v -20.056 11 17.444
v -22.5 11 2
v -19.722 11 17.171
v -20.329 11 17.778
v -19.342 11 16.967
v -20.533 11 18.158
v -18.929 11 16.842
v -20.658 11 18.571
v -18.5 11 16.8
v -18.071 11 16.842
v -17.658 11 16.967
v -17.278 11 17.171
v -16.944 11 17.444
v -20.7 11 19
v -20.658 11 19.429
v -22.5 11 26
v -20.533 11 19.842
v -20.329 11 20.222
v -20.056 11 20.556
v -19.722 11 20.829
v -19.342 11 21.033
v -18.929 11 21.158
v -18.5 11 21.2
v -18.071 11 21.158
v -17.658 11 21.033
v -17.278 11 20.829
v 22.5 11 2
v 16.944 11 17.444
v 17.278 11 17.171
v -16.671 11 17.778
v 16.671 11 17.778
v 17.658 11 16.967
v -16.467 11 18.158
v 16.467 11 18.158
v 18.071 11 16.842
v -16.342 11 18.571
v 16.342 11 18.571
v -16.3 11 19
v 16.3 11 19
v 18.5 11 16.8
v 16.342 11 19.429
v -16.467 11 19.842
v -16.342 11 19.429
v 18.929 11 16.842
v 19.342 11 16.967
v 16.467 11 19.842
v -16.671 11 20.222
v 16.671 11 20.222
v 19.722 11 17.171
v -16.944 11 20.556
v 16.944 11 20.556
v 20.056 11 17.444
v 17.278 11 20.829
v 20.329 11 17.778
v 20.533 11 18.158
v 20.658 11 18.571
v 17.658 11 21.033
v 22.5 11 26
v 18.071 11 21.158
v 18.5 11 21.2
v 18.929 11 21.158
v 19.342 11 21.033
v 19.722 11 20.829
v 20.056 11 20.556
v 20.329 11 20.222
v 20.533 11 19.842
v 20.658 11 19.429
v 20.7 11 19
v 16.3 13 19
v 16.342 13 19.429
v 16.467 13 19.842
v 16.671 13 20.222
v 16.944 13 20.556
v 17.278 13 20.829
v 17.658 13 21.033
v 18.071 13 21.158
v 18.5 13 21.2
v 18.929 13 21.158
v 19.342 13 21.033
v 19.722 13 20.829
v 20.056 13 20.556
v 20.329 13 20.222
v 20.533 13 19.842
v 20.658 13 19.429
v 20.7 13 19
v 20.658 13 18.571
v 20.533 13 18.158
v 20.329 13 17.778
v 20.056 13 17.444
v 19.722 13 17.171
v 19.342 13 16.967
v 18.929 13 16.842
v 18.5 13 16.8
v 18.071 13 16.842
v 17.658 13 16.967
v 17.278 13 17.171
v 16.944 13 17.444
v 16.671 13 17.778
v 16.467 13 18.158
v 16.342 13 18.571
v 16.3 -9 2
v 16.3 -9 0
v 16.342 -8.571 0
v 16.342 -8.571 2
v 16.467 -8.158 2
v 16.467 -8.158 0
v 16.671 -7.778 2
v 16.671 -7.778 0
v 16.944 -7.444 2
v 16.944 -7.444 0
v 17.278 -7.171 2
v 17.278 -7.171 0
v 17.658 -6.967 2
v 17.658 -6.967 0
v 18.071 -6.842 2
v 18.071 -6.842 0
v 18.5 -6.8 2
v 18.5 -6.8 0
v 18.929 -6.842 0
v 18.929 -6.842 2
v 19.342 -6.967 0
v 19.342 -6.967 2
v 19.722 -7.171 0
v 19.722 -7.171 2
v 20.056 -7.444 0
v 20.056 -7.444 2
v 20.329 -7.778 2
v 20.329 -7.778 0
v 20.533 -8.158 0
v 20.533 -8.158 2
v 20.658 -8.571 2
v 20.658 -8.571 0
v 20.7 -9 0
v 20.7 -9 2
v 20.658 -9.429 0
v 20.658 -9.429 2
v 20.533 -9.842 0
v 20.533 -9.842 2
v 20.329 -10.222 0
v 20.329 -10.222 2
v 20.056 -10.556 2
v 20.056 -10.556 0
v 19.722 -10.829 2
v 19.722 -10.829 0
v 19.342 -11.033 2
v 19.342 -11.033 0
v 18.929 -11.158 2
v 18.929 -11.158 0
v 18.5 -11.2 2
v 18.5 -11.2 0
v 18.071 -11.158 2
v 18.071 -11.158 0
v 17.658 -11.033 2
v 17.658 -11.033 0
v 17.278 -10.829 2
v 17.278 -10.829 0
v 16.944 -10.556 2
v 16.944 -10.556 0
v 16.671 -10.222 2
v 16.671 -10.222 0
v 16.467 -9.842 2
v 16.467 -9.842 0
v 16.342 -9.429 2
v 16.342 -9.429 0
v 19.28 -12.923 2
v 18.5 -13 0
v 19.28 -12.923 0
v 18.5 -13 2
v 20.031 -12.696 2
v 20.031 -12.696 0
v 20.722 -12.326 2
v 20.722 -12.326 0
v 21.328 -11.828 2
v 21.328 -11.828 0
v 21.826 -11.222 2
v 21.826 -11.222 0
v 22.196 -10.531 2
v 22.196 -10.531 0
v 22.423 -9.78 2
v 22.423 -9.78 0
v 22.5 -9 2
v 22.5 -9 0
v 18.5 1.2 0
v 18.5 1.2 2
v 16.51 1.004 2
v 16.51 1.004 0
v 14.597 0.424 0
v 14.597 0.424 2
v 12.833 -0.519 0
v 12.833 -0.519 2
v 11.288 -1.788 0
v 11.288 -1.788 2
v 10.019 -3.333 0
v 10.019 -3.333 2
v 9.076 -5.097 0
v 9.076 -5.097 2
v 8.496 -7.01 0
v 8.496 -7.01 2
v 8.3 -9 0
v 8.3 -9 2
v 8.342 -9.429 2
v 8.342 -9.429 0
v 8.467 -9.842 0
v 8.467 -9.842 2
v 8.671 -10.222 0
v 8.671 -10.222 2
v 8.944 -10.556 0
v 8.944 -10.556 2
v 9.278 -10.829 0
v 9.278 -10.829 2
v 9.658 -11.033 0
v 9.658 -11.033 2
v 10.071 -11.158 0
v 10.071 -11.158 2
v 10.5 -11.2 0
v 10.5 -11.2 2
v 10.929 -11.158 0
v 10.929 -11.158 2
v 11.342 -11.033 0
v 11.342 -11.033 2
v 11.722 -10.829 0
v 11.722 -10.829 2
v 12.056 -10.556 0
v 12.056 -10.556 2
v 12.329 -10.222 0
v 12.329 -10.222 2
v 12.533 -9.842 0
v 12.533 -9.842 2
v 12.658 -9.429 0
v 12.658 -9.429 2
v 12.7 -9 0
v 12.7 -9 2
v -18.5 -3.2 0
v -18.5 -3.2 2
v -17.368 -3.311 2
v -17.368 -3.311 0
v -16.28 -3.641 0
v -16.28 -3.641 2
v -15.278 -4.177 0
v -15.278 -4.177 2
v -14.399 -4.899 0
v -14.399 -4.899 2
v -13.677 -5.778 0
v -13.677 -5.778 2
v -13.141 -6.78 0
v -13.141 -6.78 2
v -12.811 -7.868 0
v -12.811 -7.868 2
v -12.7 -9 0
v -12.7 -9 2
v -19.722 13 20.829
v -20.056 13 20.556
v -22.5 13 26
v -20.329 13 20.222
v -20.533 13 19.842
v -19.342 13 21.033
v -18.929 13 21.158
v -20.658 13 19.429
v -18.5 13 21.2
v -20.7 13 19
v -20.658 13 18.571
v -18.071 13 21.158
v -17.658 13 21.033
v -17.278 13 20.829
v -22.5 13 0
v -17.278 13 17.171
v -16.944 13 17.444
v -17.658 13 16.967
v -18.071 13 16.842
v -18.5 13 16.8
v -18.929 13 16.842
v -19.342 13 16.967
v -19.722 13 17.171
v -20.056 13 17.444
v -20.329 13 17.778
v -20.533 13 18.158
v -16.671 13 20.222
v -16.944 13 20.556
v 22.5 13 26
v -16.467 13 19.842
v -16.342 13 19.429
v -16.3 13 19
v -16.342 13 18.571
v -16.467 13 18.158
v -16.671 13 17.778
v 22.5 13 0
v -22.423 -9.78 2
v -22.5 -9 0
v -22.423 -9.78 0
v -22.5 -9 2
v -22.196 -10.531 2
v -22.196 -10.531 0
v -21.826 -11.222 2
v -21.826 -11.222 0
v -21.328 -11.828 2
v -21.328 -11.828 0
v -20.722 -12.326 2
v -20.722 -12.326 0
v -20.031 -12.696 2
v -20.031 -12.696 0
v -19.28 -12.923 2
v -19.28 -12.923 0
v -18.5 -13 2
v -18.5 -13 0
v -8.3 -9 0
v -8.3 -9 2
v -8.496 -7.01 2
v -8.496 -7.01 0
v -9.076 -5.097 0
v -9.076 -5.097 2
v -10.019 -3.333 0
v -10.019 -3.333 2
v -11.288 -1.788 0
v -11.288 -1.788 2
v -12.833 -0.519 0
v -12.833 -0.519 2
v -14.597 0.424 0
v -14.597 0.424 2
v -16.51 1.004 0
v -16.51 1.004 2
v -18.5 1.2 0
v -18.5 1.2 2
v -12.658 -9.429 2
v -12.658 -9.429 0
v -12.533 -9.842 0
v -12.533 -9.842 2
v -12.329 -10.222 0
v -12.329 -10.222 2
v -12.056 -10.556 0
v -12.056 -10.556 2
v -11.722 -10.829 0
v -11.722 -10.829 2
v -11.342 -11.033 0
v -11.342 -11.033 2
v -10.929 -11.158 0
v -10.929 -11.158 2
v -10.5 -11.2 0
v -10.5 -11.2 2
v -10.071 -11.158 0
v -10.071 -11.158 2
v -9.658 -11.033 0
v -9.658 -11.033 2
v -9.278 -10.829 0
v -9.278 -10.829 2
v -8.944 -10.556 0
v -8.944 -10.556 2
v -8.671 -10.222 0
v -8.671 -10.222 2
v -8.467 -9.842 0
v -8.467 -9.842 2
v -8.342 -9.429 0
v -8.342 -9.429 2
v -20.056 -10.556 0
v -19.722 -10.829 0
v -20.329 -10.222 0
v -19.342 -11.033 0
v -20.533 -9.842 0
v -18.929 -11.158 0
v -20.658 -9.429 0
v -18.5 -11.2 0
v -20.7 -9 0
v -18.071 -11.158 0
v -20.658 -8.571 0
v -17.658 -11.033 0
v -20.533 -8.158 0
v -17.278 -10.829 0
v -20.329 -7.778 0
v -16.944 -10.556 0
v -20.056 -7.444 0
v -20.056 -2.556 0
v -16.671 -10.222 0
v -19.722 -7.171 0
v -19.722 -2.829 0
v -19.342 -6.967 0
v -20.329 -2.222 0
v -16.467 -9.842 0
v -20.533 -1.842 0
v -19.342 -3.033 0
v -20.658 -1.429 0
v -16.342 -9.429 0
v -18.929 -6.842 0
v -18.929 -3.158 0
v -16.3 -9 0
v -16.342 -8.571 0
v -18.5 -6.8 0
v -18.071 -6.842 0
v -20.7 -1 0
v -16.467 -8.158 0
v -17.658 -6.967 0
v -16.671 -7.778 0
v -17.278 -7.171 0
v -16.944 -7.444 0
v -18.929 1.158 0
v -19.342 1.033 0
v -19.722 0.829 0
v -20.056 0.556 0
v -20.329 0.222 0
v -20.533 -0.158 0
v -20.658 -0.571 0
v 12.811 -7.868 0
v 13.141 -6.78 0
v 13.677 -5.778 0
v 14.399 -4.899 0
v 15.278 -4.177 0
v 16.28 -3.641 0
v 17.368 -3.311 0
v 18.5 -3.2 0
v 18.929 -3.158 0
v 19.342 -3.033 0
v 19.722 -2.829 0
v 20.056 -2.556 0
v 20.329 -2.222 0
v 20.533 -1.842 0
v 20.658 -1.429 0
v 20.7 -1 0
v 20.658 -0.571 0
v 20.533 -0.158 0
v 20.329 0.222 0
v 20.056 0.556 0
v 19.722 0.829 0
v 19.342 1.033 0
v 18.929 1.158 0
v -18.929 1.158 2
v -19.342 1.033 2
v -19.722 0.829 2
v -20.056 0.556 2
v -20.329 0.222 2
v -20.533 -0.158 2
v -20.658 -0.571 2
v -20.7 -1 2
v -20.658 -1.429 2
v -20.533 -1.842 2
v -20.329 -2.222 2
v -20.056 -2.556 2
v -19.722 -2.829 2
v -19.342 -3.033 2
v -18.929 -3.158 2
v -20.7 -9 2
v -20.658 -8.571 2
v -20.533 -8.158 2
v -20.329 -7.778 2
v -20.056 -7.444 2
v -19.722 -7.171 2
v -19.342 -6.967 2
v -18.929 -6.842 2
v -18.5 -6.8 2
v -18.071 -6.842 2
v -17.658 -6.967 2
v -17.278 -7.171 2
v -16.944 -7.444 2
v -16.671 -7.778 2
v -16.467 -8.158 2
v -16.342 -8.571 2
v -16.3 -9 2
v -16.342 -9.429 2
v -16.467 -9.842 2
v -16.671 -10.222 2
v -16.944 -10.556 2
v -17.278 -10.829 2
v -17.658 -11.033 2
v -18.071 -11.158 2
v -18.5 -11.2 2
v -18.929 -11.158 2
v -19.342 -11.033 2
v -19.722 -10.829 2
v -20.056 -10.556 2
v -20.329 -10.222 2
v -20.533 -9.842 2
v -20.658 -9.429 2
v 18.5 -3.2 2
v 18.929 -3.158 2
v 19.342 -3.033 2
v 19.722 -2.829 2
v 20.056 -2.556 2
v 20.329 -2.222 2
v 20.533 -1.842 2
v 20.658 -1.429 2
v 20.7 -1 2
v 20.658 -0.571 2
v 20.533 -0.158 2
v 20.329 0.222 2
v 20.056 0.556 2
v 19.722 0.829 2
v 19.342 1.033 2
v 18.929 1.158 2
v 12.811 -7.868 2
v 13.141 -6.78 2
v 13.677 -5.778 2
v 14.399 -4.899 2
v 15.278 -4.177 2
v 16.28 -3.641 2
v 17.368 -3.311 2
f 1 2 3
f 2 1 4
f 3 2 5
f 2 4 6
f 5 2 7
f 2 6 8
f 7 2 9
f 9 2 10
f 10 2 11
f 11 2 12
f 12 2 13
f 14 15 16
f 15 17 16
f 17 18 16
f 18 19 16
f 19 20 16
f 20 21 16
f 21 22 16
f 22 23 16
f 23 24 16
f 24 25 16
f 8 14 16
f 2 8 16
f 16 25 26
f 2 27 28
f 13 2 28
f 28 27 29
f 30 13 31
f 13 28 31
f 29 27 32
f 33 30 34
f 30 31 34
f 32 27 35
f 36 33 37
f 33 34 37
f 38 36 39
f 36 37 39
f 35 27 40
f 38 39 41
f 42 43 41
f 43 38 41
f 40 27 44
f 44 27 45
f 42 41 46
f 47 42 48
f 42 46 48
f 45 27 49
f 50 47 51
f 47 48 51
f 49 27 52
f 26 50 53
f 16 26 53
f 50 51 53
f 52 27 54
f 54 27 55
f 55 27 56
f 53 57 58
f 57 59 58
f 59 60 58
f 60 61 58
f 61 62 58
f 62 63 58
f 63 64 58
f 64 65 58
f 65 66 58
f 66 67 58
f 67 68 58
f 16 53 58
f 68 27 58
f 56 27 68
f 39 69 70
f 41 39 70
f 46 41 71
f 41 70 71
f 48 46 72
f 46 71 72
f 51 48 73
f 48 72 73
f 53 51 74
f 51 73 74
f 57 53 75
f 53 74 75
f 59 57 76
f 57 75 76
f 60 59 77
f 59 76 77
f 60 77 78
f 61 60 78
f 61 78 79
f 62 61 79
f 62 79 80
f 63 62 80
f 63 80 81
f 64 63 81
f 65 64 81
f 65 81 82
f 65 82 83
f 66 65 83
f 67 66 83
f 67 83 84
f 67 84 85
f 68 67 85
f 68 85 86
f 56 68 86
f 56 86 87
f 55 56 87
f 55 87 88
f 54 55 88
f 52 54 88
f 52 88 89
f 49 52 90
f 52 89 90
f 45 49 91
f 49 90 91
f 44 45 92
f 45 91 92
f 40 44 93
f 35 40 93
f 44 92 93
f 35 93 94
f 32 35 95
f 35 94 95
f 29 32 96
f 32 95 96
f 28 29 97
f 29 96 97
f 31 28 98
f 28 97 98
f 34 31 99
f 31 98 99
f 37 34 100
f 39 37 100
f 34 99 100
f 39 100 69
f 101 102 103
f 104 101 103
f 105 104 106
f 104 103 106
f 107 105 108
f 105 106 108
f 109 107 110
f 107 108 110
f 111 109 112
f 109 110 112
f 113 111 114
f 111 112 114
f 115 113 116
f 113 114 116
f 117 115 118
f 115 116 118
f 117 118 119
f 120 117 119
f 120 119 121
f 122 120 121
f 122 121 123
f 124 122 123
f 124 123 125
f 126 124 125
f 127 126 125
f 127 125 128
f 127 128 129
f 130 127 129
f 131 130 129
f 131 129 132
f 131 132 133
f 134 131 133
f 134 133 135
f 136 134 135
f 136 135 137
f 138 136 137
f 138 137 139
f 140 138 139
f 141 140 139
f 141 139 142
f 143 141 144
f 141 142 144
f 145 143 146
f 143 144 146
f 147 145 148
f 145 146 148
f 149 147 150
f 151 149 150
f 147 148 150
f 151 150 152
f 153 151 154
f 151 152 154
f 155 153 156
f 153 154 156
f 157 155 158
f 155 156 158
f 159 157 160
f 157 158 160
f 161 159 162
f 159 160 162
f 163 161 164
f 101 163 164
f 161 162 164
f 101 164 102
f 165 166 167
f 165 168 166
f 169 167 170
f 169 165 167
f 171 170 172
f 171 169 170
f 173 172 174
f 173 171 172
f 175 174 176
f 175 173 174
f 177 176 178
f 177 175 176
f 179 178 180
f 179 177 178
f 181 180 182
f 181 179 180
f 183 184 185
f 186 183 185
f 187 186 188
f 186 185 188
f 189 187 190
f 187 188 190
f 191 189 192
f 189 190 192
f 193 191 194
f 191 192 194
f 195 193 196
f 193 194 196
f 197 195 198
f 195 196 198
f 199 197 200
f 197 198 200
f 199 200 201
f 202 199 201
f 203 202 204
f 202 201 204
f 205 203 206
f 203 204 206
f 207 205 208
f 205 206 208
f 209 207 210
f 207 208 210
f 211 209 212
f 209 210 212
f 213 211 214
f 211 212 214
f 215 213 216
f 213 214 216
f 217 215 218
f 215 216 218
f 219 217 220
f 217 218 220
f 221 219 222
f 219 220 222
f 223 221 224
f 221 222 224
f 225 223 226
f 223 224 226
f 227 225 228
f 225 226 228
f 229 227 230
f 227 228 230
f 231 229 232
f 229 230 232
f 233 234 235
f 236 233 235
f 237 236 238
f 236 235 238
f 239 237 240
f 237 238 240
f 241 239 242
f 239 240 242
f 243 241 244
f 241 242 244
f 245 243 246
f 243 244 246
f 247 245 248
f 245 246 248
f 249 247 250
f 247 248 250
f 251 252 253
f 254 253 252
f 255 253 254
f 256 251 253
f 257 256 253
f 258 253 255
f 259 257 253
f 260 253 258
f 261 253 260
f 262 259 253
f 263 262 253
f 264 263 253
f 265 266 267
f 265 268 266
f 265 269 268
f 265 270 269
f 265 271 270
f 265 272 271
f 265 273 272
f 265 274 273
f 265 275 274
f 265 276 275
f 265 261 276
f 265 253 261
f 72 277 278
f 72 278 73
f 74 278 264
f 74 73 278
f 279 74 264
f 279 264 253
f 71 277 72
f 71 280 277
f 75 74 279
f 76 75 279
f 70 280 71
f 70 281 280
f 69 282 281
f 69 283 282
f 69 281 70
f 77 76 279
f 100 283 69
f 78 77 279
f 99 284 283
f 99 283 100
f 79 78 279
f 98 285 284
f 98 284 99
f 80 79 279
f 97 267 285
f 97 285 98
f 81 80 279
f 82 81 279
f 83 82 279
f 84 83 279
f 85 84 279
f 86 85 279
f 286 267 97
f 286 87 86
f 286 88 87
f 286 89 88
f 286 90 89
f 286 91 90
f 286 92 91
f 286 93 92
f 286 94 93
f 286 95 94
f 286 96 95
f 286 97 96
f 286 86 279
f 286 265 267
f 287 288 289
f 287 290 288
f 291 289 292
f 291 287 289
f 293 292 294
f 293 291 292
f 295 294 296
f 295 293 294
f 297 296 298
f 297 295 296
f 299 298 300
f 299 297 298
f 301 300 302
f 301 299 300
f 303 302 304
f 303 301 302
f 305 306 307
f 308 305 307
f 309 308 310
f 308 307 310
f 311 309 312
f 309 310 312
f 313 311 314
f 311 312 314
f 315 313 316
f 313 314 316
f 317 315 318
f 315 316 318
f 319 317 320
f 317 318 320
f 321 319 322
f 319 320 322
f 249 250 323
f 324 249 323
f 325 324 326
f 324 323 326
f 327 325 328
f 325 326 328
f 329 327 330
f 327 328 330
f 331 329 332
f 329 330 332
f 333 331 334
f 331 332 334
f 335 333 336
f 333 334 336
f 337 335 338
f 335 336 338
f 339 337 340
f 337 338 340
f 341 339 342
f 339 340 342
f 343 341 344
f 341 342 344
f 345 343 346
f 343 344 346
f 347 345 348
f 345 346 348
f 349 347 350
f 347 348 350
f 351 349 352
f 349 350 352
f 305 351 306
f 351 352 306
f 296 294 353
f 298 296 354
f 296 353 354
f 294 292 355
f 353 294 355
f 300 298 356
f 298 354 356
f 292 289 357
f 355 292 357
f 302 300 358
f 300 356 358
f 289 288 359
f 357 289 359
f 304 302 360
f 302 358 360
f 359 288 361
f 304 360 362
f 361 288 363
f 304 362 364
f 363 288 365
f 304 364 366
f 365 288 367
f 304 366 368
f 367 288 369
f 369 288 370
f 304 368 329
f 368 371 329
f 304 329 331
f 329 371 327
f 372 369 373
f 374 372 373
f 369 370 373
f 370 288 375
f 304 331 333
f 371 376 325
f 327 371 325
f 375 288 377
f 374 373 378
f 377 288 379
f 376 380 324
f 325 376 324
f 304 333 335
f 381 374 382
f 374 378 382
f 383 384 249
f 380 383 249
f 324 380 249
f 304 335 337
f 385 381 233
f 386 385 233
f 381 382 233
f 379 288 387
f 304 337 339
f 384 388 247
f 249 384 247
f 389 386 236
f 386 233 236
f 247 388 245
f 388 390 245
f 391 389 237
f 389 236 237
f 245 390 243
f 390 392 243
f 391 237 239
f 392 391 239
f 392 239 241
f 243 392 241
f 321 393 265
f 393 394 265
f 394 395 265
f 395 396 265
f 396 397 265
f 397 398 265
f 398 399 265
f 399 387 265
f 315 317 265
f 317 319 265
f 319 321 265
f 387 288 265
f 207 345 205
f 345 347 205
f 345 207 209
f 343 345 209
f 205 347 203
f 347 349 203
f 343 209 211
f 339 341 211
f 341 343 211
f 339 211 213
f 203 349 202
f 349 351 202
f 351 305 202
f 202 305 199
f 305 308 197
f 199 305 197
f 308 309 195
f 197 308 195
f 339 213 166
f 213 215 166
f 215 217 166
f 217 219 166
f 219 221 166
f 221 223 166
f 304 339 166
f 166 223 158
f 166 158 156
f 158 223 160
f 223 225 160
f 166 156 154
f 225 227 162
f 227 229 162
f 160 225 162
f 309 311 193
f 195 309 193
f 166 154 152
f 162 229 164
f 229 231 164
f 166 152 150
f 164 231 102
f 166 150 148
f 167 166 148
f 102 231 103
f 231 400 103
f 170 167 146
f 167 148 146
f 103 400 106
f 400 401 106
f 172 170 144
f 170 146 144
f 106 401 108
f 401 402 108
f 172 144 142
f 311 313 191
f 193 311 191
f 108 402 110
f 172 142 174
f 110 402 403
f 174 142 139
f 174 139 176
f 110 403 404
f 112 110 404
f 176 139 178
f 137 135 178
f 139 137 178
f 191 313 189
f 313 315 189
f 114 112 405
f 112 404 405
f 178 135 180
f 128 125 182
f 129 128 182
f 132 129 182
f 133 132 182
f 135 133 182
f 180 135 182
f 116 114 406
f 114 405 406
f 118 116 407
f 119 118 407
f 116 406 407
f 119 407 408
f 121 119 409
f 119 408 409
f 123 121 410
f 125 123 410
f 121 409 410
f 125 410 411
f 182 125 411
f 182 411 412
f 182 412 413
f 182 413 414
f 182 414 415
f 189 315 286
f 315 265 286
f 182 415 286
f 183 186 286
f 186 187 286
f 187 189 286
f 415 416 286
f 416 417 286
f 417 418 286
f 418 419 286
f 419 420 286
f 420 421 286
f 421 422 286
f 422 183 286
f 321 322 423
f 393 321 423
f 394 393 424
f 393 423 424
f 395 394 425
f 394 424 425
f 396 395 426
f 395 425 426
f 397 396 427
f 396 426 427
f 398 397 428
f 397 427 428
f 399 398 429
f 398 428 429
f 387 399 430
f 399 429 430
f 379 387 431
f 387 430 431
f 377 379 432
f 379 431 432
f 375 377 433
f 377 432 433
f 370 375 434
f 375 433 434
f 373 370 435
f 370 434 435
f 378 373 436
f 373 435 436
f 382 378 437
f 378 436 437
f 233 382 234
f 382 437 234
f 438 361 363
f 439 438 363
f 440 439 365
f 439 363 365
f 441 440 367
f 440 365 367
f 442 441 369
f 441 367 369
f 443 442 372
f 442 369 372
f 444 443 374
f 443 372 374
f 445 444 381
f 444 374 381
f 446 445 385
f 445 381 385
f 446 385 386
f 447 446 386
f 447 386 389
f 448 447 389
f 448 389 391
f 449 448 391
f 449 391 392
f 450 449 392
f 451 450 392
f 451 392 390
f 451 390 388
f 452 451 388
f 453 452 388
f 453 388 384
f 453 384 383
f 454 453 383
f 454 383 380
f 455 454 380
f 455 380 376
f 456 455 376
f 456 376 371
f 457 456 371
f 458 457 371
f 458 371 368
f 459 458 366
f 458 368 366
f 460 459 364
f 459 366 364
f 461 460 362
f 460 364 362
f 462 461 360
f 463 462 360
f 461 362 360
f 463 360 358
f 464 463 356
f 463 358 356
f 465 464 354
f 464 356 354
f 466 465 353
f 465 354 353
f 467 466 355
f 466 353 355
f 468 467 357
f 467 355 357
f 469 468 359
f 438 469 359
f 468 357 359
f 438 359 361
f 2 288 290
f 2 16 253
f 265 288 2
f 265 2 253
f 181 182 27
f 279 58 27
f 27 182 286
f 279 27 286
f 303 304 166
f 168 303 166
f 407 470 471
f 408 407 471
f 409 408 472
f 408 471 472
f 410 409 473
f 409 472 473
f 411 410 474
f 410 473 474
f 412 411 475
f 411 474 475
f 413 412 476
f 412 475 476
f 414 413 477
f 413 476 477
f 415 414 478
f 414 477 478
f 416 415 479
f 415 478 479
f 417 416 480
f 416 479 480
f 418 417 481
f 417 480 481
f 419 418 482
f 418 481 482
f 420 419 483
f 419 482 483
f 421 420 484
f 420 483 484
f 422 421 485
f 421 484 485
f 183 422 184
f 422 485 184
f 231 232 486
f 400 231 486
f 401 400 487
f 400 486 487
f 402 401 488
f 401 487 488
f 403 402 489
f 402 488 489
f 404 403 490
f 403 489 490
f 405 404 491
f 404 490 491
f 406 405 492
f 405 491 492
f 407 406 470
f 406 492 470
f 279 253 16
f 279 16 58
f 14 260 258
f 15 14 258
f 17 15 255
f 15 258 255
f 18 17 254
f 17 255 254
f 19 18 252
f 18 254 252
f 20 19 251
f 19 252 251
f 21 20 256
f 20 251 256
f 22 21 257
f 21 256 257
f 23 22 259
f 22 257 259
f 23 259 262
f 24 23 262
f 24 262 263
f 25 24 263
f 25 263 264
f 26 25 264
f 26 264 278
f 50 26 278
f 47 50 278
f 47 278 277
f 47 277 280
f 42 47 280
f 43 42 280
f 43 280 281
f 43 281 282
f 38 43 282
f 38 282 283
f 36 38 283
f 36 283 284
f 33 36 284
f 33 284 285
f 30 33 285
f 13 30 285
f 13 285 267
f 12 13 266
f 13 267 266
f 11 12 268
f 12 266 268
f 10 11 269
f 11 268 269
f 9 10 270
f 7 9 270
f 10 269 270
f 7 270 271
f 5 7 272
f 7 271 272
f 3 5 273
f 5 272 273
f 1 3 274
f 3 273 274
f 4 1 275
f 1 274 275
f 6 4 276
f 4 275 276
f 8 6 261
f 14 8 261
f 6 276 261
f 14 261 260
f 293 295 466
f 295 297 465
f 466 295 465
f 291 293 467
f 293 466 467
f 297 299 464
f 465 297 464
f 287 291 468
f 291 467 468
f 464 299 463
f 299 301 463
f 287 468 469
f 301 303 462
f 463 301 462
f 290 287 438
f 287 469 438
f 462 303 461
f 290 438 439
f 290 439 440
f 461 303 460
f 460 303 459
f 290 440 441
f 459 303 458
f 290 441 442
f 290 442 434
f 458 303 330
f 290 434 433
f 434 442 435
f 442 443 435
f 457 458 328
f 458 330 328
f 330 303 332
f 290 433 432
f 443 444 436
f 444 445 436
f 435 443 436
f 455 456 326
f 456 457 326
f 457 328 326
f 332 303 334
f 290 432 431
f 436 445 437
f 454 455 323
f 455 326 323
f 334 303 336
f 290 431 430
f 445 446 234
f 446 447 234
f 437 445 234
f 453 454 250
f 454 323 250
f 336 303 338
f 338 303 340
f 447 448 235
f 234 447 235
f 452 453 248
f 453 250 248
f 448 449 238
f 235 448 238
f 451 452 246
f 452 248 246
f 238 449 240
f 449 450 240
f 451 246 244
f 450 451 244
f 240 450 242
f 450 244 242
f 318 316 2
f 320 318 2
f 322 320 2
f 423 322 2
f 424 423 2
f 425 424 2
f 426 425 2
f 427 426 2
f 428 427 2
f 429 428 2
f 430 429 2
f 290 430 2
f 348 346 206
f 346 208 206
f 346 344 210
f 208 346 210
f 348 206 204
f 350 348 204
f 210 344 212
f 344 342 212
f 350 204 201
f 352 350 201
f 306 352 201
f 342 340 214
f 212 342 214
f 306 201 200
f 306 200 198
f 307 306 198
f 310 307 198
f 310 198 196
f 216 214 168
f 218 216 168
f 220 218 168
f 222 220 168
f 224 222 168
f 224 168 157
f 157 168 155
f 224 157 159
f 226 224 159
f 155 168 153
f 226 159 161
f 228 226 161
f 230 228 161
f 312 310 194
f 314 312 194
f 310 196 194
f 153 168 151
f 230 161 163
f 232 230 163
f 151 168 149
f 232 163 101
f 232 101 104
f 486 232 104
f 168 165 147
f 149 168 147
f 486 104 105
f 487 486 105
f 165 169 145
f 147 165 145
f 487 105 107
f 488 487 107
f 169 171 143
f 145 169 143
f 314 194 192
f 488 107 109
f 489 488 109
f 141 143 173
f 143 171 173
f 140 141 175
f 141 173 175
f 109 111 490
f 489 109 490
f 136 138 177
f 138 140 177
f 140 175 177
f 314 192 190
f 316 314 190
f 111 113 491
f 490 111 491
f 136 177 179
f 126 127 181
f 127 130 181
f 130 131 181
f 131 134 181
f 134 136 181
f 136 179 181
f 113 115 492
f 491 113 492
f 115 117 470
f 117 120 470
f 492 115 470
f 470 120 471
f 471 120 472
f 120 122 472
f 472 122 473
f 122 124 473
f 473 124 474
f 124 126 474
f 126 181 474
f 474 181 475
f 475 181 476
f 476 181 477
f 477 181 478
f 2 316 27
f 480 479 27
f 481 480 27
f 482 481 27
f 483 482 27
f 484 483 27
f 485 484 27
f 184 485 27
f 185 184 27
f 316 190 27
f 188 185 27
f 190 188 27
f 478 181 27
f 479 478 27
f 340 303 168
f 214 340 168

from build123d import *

# Parameters (mm, degrees)
F0_W     = 45
F0_H     = 26
F1_DEPTH = 26
F2_W     = 24
F2_H     = 24
F3_DEPTH = 45.001
F5_D     = 4.4
F7_D     = 4.4
F9_DEPTH = 2.001
F10_R    = 4


with BuildPart() as f1:
    # F0 (on Top) → F1 (new body)
    with BuildSketch(Plane.XY):
        Rectangle(F0_W, F0_H)
    extrude(amount=F1_DEPTH)

    # F2 (on face) → F3 (cut, through all)
    with BuildSketch(Plane.YZ.offset(22.5)):
        with Locations((-1, 14)):
            Rectangle(F2_W, F2_H)
    extrude(amount=-F3_DEPTH, mode=Mode.SUBTRACT)

    # F5 (through all)
    with Locations(Plane.XY.offset(2)):
        with Locations((-18.5, -9), (18.5, -9)):
            Hole(F5_D / 2)

    # F7 (through all)
    with Locations(Plane.XZ.offset(-11)):
        with Locations((-18.5, 19), (18.5, 19)):
            Hole(F7_D / 2)

    # F8 (on face) → F9 (cut, through all)
    with BuildSketch(Plane.XY.offset(2)):
        with BuildLine():
            ThreePointArc((-12.7, -9), (-10.5, -11.2), (-8.3, -9))
            ThreePointArc((-8.3, -9), (-11.2875108319, -1.7875108319), (-18.5, 1.2))
            ThreePointArc((-18.5, 1.2), (-20.7, -1), (-18.5, -3.2))
            ThreePointArc((-18.5, -3.2), (-14.3987806691, -4.8987806691), (-12.7, -9))
        make_face()
        with BuildLine():
            ThreePointArc((18.5, 1.2), (11.2875108319, -1.7875108319), (8.3, -9))
            ThreePointArc((8.3, -9), (10.5, -11.2), (12.7, -9))
            ThreePointArc((12.7, -9), (14.3987806691, -4.8987806691), (18.5, -3.2))
            ThreePointArc((18.5, -3.2), (20.7, -1), (18.5, 1.2))
        make_face()
    extrude(amount=-F9_DEPTH, mode=Mode.SUBTRACT)

    # F10
    f10_edges = [f1.edges().sort_by_distance(p)[0] for p in [
        (-22.5, -13, 1),
        (22.5, -13, 1),
    ]]
    fillet(f10_edges, radius=F10_R)


solid = f1.part
